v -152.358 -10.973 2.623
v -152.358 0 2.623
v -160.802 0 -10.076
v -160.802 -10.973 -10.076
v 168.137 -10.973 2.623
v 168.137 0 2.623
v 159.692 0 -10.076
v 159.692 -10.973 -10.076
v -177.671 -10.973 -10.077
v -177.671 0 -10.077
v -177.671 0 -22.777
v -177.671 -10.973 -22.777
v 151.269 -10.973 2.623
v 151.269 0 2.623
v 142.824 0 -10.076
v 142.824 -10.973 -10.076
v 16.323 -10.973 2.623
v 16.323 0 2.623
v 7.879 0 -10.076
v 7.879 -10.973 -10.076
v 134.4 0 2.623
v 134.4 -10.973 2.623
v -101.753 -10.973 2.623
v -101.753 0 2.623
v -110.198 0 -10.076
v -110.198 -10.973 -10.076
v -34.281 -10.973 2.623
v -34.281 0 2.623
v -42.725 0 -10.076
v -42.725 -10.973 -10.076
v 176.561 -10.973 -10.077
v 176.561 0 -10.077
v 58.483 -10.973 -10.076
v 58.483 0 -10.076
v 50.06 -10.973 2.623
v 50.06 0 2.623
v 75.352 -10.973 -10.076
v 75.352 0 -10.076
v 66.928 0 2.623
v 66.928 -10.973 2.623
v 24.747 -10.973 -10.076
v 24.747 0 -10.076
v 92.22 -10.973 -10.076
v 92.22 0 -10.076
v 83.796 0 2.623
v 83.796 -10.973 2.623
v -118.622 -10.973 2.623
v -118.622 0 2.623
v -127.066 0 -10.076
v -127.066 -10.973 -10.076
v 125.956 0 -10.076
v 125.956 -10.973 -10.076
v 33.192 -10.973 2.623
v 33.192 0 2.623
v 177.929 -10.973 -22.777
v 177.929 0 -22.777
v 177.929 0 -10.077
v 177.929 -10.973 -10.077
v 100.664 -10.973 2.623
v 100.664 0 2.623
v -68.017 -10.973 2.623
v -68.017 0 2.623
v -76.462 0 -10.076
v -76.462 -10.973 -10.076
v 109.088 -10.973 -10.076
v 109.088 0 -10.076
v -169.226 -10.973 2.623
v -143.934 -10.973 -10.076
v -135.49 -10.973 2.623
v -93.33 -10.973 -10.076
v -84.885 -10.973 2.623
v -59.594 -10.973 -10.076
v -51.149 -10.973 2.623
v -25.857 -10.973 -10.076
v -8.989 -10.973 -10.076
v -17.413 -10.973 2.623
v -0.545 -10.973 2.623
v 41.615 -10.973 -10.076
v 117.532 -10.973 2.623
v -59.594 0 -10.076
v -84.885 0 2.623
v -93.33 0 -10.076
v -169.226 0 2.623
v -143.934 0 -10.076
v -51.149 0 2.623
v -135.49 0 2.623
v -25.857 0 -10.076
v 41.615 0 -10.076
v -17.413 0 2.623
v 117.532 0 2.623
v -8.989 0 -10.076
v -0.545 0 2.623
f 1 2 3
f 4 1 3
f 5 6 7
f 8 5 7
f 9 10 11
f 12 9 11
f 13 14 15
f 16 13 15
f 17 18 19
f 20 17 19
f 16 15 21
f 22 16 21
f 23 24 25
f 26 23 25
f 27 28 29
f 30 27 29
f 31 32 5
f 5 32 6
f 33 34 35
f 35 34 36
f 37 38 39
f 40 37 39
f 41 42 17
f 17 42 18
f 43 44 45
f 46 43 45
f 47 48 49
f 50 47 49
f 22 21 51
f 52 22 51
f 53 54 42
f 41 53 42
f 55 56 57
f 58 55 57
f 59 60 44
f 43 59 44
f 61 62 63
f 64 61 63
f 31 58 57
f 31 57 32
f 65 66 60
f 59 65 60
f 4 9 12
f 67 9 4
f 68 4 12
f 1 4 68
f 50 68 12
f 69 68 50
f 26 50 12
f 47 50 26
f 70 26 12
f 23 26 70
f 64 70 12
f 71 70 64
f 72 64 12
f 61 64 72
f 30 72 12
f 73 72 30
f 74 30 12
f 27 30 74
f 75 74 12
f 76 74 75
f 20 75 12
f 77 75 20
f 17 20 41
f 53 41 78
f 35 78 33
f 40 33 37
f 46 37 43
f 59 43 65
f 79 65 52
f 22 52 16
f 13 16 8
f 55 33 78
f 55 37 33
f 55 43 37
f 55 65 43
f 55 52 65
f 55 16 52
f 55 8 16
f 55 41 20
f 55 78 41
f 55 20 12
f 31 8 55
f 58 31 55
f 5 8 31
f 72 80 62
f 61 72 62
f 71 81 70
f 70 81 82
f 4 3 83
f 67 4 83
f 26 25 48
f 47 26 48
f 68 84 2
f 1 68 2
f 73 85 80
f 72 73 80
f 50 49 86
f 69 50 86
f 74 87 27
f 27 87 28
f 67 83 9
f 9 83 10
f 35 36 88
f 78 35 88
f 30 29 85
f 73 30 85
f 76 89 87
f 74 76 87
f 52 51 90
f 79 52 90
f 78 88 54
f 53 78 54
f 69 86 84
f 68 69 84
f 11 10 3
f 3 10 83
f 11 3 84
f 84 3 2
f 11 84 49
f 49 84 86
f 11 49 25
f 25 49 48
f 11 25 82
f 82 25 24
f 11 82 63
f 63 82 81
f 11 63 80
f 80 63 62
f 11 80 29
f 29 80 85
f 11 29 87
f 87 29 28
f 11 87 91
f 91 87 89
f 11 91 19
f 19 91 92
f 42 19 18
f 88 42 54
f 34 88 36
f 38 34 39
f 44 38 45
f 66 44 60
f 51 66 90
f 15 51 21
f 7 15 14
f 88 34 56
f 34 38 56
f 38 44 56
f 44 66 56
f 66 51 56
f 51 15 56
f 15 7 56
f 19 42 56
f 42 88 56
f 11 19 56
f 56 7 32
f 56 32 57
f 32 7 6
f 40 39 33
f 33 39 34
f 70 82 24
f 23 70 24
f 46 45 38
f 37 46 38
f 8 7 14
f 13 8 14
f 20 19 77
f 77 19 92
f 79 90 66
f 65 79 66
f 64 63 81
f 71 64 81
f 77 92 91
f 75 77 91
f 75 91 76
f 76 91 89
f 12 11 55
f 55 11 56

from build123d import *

# Parameters (mm, degrees)
F1_DEPTH = 10.9728


with BuildPart() as f1:
    # F0 (on Front) → F1 (new body)
    with BuildSketch(Plane.XZ):
        Polygon((-177.6711943626, -10.0771774247), (-177.6711943626, -22.7771774247), (177.9288056374, -22.7771774247), (177.9288056374, -10.0771774247), (176.5609765906, -10.0771774247), (159.6928365906, -10.0771774247), (159.6916056374, -10.0771774247), (142.8246965906, -10.0771774247), (142.8234656374, -10.0771774247), (125.9565565906, -10.0771774247), (125.9553256374, -10.0771774247), (109.0884165906, -10.0771774247), (109.0871856374, -10.0771774247), (92.2202765906, -10.0771774247), (92.2190456374, -10.0771774247), (75.3521365906, -10.0771774247), (75.3509056374, -10.0771774247), (58.4839965906, -10.0771774247), (58.4827656374, -10.0771774247), (41.6158565906, -10.0771774247), (41.6146256374, -10.0771774247), (24.7477165906, -10.0771774247), (24.7464856374, -10.0771774247), (7.8795765906, -10.0771774247), (7.8783456374, -10.0771774247), (-8.9885634094, -10.0771774247), (-8.9897943626, -10.0771774247), (-25.8567034094, -10.0771774247), (-25.8579343626, -10.0771774247), (-42.7248434094, -10.0771774247), (-42.7260743626, -10.0771774247), (-59.5929834094, -10.0771774247), (-59.5942143626, -10.0771774247), (-76.4611234094, -10.0771774247), (-76.4623543626, -10.0771774247), (-93.3292634094, -10.0771774247), (-93.3304943626, -10.0771774247), (-110.1974034094, -10.0771774247), (-110.1986343626, -10.0771774247), (-127.0655434094, -10.0771774247), (-127.0667743626, -10.0771774247), (-143.9336834094, -10.0771774247), (-143.9349143626, -10.0771774247), (-160.8018234094, -10.0771774247), (-160.8030543626, -10.0771774247), align=None)
        Polygon((-169.2260503769, 2.6228225753), (-177.6711943626, -10.0771774247), (-160.8030543626, -10.0771774247), (-160.8024381229, -10.0762507093), align=None)
        Polygon((-160.8024381229, -10.0762507093), (-160.8030543626, -10.0771774247), (-160.8018234094, -10.0771774247), align=None)
        Polygon((159.6928365906, -10.0771774247), (176.5609765906, -10.0771774247), (168.1367496231, 2.6228225753), (159.6922218771, -10.0762507093), align=None)
        Polygon((-160.8024381229, -10.0762507093), (-160.8018234094, -10.0771774247), (-143.9349143626, -10.0771774247), (-143.9342981229, -10.0762507093), (-152.3579103769, 2.6228225753), align=None)
        Polygon((159.6916056374, -10.0771774247), (159.6928365906, -10.0771774247), (159.6922218771, -10.0762507093), align=None)
        Polygon((-143.9342981229, -10.0762507093), (-143.9349143626, -10.0771774247), (-143.9336834094, -10.0771774247), align=None)
        Polygon((142.8246965906, -10.0771774247), (159.6916056374, -10.0771774247), (159.6922218771, -10.0762507093), (151.2686096231, 2.6228225753), (142.8240818771, -10.0762507093), align=None)
        Polygon((-143.9342981229, -10.0762507093), (-143.9336834094, -10.0771774247), (-127.0667743626, -10.0771774247), (-127.0661581229, -10.0762507093), (-135.4897703769, 2.6228225753), align=None)
        Polygon((142.8234656374, -10.0771774247), (142.8246965906, -10.0771774247), (142.8240818771, -10.0762507093), align=None)
        Polygon((-127.0661581229, -10.0762507093), (-127.0667743626, -10.0771774247), (-127.0655434094, -10.0771774247), align=None)
        Polygon((125.9565565906, -10.0771774247), (142.8234656374, -10.0771774247), (142.8240818771, -10.0762507093), (134.4004696231, 2.6228225753), (125.9559418771, -10.0762507093), align=None)
        Polygon((-127.0661581229, -10.0762507093), (-127.0655434094, -10.0771774247), (-110.1986343626, -10.0771774247), (-110.1980181229, -10.0762507093), (-118.6216303769, 2.6228225753), align=None)
        Polygon((125.9553256374, -10.0771774247), (125.9565565906, -10.0771774247), (125.9559418771, -10.0762507093), align=None)
        Polygon((-110.1980181229, -10.0762507093), (-110.1986343626, -10.0771774247), (-110.1974034094, -10.0771774247), align=None)
        Polygon((109.0884165906, -10.0771774247), (125.9553256374, -10.0771774247), (125.9559418771, -10.0762507093), (117.5323296231, 2.6228225753), (109.0878018771, -10.0762507093), align=None)
        Polygon((-110.1980181229, -10.0762507093), (-110.1974034094, -10.0771774247), (-93.3304943626, -10.0771774247), (-93.3298781229, -10.0762507093), (-101.7534903769, 2.6228225753), align=None)
        Polygon((109.0871856374, -10.0771774247), (109.0884165906, -10.0771774247), (109.0878018771, -10.0762507093), align=None)
        Polygon((-93.3298781229, -10.0762507093), (-93.3304943626, -10.0771774247), (-93.3292634094, -10.0771774247), align=None)
        Polygon((92.2202765906, -10.0771774247), (109.0871856374, -10.0771774247), (109.0878018771, -10.0762507093), (100.6641896231, 2.6228225753), (92.2196618771, -10.0762507093), align=None)
        Polygon((-93.3298781229, -10.0762507093), (-93.3292634094, -10.0771774247), (-76.4623543626, -10.0771774247), (-76.4617381229, -10.0762507093), (-84.8853503769, 2.6228225753), align=None)
        Polygon((92.2190456374, -10.0771774247), (92.2202765906, -10.0771774247), (92.2196618771, -10.0762507093), align=None)
        Polygon((-76.4617381229, -10.0762507093), (-76.4623543626, -10.0771774247), (-76.4611234094, -10.0771774247), align=None)
        Polygon((75.3521365906, -10.0771774247), (92.2190456374, -10.0771774247), (92.2196618771, -10.0762507093), (83.7960496231, 2.6228225753), (75.3515218771, -10.0762507093), align=None)
        Polygon((-76.4617381229, -10.0762507093), (-76.4611234094, -10.0771774247), (-59.5942143626, -10.0771774247), (-59.5935981229, -10.0762507093), (-68.0172103769, 2.6228225753), align=None)
        Polygon((75.3509056374, -10.0771774247), (75.3521365906, -10.0771774247), (75.3515218771, -10.0762507093), align=None)
        Polygon((-59.5935981229, -10.0762507093), (-59.5942143626, -10.0771774247), (-59.5929834094, -10.0771774247), align=None)
        Polygon((58.4839965906, -10.0771774247), (75.3509056374, -10.0771774247), (75.3515218771, -10.0762507093), (66.9279096231, 2.6228225753), (58.4833818771, -10.0762507093), align=None)
        Polygon((-59.5935981229, -10.0762507093), (-59.5929834094, -10.0771774247), (-42.7260743626, -10.0771774247), (-42.7254581229, -10.0762507093), (-51.1490703769, 2.6228225753), align=None)
        Polygon((58.4827656374, -10.0771774247), (58.4839965906, -10.0771774247), (58.4833818771, -10.0762507093), align=None)
        Polygon((-42.7254581229, -10.0762507093), (-42.7260743626, -10.0771774247), (-42.7248434094, -10.0771774247), align=None)
        Polygon((41.6158565906, -10.0771774247), (58.4827656374, -10.0771774247), (58.4833818771, -10.0762507093), (50.0597696231, 2.6228225753), (41.6152418771, -10.0762507093), align=None)
        Polygon((-42.7254581229, -10.0762507093), (-42.7248434094, -10.0771774247), (-25.8579343626, -10.0771774247), (-25.8573181229, -10.0762507093), (-34.2809303769, 2.6228225753), align=None)
        Polygon((41.6146256374, -10.0771774247), (41.6158565906, -10.0771774247), (41.6152418771, -10.0762507093), align=None)
        Polygon((-25.8573181229, -10.0762507093), (-25.8579343626, -10.0771774247), (-25.8567034094, -10.0771774247), align=None)
        Polygon((24.7477165906, -10.0771774247), (41.6146256374, -10.0771774247), (41.6152418771, -10.0762507093), (33.1916296231, 2.6228225753), (24.7471018771, -10.0762507093), align=None)
        Polygon((-25.8573181229, -10.0762507093), (-25.8567034094, -10.0771774247), (-8.9897943626, -10.0771774247), (-8.9891781229, -10.0762507093), (-17.4127903769, 2.6228225753), align=None)
        Polygon((24.7464856374, -10.0771774247), (24.7477165906, -10.0771774247), (24.7471018771, -10.0762507093), align=None)
        Polygon((-8.9891781229, -10.0762507093), (-8.9897943626, -10.0771774247), (-8.9885634094, -10.0771774247), align=None)
        Polygon((7.8795765906, -10.0771774247), (24.7464856374, -10.0771774247), (24.7471018771, -10.0762507093), (16.3234896231, 2.6228225753), (7.8789618771, -10.0762507093), align=None)
        Polygon((-8.9891781229, -10.0762507093), (-8.9885634094, -10.0771774247), (7.8783456374, -10.0771774247), (7.8789618771, -10.0762507093), (-0.5446503769, 2.6228225753), align=None)
        Polygon((7.8783456374, -10.0771774247), (7.8795765906, -10.0771774247), (7.8789618771, -10.0762507093), align=None)
    extrude(amount=F1_DEPTH)


solid = f1.part
